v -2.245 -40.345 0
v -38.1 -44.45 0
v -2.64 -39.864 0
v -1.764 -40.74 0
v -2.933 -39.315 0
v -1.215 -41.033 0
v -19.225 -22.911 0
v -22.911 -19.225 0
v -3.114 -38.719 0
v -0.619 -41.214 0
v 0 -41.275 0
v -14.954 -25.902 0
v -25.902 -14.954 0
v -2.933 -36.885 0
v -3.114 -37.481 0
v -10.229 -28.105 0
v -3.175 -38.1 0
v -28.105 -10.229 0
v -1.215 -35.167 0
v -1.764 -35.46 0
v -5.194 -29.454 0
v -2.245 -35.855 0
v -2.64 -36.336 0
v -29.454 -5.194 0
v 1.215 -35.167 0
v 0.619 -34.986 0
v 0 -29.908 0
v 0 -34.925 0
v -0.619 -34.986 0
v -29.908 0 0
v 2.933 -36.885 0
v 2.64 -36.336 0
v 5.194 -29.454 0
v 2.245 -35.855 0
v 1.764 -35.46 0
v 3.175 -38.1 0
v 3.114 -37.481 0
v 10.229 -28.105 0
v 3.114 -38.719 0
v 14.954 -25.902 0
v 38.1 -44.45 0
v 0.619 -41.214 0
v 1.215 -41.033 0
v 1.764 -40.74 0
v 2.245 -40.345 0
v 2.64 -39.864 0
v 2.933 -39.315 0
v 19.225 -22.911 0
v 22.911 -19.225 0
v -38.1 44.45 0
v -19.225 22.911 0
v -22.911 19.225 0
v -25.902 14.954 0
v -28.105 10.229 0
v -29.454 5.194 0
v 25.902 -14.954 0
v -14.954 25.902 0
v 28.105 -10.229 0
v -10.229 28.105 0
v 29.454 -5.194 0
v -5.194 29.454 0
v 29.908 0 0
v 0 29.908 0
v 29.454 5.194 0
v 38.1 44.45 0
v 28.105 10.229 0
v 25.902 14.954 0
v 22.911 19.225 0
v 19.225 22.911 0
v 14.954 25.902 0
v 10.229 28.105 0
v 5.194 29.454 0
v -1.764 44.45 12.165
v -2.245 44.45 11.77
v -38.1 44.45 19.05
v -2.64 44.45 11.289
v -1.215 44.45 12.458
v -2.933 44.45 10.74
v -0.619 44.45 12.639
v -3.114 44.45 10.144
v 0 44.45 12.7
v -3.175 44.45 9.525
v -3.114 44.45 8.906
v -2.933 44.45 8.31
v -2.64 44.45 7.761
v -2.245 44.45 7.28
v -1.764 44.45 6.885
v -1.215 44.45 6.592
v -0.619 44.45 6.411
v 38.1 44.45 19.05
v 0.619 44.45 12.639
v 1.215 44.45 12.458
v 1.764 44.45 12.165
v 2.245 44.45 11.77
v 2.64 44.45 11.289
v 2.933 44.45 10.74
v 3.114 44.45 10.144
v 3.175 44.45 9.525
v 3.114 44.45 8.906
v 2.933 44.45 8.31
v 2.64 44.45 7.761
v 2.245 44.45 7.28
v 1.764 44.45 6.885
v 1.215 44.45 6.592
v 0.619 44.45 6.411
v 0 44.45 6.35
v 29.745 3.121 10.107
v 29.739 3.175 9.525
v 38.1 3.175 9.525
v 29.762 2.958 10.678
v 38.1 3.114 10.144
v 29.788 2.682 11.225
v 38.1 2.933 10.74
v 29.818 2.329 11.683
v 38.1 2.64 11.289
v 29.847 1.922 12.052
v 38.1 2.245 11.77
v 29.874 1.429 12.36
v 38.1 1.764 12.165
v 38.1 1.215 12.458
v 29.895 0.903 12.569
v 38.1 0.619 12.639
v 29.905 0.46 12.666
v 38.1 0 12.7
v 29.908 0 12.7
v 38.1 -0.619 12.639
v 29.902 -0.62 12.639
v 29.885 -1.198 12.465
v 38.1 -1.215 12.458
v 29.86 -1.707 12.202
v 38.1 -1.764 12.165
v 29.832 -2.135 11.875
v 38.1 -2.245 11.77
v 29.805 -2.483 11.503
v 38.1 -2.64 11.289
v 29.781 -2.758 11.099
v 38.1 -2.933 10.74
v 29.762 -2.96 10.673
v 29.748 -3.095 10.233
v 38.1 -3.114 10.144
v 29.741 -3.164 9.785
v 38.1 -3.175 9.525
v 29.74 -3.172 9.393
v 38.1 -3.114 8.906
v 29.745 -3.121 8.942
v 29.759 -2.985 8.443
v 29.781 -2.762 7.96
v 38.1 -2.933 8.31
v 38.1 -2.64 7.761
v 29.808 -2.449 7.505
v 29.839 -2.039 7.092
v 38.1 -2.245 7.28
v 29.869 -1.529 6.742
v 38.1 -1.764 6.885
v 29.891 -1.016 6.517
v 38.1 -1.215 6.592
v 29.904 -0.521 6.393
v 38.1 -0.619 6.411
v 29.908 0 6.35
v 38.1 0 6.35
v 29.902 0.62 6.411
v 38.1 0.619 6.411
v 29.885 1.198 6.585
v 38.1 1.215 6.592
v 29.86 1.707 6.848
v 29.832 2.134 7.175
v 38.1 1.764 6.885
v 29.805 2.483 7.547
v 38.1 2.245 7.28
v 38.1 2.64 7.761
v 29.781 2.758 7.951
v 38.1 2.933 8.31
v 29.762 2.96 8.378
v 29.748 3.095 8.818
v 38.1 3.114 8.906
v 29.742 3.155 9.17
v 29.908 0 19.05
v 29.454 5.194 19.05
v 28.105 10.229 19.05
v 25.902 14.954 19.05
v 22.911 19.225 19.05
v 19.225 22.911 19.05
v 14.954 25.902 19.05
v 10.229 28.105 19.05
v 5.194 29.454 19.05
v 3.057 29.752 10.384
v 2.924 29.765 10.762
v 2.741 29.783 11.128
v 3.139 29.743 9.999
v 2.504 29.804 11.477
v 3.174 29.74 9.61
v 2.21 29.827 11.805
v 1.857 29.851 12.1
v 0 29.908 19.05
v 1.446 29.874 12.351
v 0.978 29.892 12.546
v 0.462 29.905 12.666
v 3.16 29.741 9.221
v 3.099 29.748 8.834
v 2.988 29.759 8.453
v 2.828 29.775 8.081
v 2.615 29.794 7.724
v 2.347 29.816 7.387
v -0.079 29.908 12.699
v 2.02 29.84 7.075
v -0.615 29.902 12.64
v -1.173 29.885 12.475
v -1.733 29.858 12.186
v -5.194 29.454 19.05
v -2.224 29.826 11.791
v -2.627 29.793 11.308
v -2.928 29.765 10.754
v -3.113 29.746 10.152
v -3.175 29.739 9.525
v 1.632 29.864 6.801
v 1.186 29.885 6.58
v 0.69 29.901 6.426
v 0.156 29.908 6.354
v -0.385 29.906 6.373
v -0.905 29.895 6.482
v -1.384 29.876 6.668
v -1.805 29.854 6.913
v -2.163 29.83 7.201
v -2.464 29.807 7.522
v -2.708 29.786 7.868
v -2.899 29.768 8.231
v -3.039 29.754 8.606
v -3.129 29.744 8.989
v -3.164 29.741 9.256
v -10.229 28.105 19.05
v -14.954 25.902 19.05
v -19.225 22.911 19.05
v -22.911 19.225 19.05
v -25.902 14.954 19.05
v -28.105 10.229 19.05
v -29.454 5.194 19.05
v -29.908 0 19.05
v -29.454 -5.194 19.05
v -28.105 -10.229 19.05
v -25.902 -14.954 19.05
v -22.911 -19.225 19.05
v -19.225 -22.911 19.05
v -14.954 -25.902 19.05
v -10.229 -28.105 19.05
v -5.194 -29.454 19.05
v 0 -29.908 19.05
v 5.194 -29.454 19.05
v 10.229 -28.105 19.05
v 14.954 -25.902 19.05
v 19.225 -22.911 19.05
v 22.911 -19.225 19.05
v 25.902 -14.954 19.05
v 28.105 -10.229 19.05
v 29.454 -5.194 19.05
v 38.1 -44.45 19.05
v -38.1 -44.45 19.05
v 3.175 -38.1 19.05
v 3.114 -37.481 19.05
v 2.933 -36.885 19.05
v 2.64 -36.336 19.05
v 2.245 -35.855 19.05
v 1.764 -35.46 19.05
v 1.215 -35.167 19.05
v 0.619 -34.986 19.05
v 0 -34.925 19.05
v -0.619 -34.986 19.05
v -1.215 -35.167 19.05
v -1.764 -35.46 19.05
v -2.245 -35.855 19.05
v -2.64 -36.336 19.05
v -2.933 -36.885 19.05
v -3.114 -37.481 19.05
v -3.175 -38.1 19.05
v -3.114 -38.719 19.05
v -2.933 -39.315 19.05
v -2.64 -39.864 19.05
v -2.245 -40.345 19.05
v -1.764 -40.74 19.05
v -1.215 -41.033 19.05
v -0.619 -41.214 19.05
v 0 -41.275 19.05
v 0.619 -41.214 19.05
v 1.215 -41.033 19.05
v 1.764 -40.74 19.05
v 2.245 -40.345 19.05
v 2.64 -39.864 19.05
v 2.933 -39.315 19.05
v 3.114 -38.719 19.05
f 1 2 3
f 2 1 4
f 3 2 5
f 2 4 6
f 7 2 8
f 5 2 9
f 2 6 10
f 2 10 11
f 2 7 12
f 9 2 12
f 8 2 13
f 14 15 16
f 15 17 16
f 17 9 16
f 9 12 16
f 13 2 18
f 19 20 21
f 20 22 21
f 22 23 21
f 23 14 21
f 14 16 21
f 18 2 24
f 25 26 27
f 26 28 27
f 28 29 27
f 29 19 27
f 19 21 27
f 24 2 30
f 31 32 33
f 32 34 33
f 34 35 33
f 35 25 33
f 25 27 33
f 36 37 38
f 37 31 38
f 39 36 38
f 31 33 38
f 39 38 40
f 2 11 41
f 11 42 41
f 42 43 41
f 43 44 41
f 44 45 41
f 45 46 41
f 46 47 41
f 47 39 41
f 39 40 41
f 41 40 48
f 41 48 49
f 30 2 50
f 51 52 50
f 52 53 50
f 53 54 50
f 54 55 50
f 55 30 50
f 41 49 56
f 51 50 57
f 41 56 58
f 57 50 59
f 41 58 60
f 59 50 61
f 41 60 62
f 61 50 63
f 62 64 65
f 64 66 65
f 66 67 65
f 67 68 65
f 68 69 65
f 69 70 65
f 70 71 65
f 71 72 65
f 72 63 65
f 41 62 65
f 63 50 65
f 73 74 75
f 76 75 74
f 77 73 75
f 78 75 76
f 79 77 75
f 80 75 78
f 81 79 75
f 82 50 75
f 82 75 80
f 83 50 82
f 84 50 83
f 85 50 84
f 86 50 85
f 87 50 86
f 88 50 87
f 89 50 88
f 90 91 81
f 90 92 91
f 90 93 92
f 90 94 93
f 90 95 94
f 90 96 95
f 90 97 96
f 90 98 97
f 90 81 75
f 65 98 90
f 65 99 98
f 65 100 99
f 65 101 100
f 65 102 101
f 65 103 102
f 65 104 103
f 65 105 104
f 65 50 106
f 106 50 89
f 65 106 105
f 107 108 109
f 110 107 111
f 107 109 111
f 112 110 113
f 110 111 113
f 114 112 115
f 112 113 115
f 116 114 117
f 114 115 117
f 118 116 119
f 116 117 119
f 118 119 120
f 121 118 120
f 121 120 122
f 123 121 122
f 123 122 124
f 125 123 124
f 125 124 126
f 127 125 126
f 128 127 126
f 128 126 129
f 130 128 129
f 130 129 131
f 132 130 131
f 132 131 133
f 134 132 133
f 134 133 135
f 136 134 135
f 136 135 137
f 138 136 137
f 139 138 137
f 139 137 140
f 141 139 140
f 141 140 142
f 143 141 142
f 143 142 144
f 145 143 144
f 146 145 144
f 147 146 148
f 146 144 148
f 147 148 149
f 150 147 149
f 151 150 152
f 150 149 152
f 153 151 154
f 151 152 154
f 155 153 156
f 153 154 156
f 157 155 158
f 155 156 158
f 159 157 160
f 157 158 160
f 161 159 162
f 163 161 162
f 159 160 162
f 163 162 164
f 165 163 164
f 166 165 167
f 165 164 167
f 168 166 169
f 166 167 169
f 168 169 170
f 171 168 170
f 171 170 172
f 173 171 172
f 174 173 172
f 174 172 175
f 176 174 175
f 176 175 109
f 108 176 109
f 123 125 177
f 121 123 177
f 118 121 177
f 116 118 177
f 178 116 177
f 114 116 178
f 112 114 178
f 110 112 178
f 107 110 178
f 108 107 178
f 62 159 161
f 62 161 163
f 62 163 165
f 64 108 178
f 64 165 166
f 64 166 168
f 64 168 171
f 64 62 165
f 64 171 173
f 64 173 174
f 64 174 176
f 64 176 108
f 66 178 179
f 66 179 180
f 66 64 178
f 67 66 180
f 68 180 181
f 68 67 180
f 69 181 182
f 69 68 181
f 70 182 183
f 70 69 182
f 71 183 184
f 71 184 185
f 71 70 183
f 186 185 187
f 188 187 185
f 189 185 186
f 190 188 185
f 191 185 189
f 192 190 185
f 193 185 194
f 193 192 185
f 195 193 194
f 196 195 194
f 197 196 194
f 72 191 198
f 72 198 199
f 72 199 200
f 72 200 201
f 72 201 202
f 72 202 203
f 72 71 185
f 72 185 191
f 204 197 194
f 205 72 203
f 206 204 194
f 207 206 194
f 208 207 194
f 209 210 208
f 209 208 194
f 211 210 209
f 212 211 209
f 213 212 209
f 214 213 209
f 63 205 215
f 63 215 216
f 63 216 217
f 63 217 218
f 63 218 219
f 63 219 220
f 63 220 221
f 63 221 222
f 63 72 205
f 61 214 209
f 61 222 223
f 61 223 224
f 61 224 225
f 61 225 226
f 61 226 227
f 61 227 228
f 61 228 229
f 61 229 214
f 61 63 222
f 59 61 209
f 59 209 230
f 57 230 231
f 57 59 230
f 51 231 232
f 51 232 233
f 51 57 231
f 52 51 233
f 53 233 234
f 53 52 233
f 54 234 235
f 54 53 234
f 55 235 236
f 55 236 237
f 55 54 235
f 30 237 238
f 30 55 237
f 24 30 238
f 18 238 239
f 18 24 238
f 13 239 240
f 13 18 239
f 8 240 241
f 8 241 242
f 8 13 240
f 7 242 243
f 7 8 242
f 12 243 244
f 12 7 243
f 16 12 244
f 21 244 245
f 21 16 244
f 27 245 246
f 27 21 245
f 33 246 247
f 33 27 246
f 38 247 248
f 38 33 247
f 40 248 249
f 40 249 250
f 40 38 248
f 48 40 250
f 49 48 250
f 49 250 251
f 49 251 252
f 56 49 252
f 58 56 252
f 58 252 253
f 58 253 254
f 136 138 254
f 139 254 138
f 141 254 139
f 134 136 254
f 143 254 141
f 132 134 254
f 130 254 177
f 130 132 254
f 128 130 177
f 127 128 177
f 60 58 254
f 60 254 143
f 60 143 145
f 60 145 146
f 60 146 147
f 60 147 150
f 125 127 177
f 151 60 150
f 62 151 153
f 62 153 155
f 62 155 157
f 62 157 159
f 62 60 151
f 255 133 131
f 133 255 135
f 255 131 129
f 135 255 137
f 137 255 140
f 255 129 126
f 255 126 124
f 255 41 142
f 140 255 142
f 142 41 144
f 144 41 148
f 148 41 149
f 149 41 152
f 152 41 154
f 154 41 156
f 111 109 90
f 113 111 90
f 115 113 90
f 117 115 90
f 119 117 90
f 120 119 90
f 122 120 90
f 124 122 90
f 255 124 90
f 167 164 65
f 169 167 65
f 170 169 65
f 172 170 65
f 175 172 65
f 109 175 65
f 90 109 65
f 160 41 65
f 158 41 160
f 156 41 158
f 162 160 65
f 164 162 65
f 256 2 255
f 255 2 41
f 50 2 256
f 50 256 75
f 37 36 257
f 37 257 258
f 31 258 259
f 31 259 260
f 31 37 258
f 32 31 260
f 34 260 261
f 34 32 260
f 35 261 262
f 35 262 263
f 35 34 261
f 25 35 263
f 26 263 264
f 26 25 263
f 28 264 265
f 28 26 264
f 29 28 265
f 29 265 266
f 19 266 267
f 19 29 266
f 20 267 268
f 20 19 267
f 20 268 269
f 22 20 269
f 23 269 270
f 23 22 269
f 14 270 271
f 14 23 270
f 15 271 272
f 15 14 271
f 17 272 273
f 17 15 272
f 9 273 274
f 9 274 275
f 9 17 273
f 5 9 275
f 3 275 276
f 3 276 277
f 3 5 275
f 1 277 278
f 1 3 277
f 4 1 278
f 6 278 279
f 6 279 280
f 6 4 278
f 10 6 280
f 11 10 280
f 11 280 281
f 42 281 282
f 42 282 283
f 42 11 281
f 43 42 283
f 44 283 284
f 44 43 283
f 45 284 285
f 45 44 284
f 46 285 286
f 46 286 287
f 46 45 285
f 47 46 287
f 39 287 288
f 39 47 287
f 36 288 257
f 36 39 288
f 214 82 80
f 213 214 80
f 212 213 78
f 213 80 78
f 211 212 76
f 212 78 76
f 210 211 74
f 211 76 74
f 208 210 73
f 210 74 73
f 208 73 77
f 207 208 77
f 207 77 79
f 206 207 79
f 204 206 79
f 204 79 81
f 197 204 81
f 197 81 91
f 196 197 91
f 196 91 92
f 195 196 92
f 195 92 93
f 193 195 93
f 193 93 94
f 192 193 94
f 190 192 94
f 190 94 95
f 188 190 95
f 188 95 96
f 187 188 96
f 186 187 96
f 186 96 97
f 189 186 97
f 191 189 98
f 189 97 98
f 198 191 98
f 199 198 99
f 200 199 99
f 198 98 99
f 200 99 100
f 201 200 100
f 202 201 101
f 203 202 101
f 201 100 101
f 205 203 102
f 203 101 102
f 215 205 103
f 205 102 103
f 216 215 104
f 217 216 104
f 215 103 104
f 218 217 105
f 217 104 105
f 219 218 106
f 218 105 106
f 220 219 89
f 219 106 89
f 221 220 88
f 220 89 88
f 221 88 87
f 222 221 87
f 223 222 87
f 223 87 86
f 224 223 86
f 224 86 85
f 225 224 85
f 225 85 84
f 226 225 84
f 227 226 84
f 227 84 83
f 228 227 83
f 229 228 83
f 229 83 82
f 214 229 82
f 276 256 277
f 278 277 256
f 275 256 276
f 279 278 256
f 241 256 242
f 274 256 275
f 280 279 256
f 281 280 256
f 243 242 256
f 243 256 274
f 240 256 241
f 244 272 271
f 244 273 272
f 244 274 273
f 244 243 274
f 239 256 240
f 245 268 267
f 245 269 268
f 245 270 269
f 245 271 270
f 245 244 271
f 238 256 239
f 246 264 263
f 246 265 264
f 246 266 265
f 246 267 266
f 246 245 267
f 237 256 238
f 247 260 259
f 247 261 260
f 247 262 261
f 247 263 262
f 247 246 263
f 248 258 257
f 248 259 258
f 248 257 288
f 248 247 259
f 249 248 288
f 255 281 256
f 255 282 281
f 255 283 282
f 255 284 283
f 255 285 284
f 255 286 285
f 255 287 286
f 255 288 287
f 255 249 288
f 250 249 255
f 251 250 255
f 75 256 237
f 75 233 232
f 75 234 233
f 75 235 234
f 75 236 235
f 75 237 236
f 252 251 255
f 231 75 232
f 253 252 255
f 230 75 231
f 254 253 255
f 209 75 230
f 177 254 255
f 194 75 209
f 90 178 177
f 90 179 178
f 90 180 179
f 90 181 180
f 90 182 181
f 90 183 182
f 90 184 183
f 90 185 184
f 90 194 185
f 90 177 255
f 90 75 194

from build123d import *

# Parameters (mm, degrees)
F0_W     = 76.2
F0_H     = 88.9
F0_R     = 3.175
F0_R_2   = 29.9085
F1_DEPTH = 19.05
F2_R     = 3.175
F3_DEPTH = 25.4
F4_R     = 3.175
F5_DEPTH = 25.4


with BuildPart() as f1:
    # F0 (on Top) → F1 (new body)
    with BuildSketch(Plane.XY):
        Rectangle(F0_W, F0_H)
        with Locations((0, -38.1)):
            Circle(F0_R, mode=Mode.SUBTRACT)
        Circle(F0_R_2, mode=Mode.SUBTRACT)
    extrude(amount=F1_DEPTH)

    # F2 (on face) → F3 (cut)
    with BuildSketch(Plane.YZ.offset(38.1)):
        with Locations((0, 9.525)):
            Circle(F2_R)
    extrude(amount=-F3_DEPTH, mode=Mode.SUBTRACT)

    # F4 (on face) → F5 (cut)
    with BuildSketch(Plane(origin=(0, 44.45, 0), x_dir=(-1, 0, 0), z_dir=(0, 1, 0))):
        with Locations((0, 9.525)):
            Circle(F4_R)
    extrude(amount=-F5_DEPTH, mode=Mode.SUBTRACT)


solid = f1.part
